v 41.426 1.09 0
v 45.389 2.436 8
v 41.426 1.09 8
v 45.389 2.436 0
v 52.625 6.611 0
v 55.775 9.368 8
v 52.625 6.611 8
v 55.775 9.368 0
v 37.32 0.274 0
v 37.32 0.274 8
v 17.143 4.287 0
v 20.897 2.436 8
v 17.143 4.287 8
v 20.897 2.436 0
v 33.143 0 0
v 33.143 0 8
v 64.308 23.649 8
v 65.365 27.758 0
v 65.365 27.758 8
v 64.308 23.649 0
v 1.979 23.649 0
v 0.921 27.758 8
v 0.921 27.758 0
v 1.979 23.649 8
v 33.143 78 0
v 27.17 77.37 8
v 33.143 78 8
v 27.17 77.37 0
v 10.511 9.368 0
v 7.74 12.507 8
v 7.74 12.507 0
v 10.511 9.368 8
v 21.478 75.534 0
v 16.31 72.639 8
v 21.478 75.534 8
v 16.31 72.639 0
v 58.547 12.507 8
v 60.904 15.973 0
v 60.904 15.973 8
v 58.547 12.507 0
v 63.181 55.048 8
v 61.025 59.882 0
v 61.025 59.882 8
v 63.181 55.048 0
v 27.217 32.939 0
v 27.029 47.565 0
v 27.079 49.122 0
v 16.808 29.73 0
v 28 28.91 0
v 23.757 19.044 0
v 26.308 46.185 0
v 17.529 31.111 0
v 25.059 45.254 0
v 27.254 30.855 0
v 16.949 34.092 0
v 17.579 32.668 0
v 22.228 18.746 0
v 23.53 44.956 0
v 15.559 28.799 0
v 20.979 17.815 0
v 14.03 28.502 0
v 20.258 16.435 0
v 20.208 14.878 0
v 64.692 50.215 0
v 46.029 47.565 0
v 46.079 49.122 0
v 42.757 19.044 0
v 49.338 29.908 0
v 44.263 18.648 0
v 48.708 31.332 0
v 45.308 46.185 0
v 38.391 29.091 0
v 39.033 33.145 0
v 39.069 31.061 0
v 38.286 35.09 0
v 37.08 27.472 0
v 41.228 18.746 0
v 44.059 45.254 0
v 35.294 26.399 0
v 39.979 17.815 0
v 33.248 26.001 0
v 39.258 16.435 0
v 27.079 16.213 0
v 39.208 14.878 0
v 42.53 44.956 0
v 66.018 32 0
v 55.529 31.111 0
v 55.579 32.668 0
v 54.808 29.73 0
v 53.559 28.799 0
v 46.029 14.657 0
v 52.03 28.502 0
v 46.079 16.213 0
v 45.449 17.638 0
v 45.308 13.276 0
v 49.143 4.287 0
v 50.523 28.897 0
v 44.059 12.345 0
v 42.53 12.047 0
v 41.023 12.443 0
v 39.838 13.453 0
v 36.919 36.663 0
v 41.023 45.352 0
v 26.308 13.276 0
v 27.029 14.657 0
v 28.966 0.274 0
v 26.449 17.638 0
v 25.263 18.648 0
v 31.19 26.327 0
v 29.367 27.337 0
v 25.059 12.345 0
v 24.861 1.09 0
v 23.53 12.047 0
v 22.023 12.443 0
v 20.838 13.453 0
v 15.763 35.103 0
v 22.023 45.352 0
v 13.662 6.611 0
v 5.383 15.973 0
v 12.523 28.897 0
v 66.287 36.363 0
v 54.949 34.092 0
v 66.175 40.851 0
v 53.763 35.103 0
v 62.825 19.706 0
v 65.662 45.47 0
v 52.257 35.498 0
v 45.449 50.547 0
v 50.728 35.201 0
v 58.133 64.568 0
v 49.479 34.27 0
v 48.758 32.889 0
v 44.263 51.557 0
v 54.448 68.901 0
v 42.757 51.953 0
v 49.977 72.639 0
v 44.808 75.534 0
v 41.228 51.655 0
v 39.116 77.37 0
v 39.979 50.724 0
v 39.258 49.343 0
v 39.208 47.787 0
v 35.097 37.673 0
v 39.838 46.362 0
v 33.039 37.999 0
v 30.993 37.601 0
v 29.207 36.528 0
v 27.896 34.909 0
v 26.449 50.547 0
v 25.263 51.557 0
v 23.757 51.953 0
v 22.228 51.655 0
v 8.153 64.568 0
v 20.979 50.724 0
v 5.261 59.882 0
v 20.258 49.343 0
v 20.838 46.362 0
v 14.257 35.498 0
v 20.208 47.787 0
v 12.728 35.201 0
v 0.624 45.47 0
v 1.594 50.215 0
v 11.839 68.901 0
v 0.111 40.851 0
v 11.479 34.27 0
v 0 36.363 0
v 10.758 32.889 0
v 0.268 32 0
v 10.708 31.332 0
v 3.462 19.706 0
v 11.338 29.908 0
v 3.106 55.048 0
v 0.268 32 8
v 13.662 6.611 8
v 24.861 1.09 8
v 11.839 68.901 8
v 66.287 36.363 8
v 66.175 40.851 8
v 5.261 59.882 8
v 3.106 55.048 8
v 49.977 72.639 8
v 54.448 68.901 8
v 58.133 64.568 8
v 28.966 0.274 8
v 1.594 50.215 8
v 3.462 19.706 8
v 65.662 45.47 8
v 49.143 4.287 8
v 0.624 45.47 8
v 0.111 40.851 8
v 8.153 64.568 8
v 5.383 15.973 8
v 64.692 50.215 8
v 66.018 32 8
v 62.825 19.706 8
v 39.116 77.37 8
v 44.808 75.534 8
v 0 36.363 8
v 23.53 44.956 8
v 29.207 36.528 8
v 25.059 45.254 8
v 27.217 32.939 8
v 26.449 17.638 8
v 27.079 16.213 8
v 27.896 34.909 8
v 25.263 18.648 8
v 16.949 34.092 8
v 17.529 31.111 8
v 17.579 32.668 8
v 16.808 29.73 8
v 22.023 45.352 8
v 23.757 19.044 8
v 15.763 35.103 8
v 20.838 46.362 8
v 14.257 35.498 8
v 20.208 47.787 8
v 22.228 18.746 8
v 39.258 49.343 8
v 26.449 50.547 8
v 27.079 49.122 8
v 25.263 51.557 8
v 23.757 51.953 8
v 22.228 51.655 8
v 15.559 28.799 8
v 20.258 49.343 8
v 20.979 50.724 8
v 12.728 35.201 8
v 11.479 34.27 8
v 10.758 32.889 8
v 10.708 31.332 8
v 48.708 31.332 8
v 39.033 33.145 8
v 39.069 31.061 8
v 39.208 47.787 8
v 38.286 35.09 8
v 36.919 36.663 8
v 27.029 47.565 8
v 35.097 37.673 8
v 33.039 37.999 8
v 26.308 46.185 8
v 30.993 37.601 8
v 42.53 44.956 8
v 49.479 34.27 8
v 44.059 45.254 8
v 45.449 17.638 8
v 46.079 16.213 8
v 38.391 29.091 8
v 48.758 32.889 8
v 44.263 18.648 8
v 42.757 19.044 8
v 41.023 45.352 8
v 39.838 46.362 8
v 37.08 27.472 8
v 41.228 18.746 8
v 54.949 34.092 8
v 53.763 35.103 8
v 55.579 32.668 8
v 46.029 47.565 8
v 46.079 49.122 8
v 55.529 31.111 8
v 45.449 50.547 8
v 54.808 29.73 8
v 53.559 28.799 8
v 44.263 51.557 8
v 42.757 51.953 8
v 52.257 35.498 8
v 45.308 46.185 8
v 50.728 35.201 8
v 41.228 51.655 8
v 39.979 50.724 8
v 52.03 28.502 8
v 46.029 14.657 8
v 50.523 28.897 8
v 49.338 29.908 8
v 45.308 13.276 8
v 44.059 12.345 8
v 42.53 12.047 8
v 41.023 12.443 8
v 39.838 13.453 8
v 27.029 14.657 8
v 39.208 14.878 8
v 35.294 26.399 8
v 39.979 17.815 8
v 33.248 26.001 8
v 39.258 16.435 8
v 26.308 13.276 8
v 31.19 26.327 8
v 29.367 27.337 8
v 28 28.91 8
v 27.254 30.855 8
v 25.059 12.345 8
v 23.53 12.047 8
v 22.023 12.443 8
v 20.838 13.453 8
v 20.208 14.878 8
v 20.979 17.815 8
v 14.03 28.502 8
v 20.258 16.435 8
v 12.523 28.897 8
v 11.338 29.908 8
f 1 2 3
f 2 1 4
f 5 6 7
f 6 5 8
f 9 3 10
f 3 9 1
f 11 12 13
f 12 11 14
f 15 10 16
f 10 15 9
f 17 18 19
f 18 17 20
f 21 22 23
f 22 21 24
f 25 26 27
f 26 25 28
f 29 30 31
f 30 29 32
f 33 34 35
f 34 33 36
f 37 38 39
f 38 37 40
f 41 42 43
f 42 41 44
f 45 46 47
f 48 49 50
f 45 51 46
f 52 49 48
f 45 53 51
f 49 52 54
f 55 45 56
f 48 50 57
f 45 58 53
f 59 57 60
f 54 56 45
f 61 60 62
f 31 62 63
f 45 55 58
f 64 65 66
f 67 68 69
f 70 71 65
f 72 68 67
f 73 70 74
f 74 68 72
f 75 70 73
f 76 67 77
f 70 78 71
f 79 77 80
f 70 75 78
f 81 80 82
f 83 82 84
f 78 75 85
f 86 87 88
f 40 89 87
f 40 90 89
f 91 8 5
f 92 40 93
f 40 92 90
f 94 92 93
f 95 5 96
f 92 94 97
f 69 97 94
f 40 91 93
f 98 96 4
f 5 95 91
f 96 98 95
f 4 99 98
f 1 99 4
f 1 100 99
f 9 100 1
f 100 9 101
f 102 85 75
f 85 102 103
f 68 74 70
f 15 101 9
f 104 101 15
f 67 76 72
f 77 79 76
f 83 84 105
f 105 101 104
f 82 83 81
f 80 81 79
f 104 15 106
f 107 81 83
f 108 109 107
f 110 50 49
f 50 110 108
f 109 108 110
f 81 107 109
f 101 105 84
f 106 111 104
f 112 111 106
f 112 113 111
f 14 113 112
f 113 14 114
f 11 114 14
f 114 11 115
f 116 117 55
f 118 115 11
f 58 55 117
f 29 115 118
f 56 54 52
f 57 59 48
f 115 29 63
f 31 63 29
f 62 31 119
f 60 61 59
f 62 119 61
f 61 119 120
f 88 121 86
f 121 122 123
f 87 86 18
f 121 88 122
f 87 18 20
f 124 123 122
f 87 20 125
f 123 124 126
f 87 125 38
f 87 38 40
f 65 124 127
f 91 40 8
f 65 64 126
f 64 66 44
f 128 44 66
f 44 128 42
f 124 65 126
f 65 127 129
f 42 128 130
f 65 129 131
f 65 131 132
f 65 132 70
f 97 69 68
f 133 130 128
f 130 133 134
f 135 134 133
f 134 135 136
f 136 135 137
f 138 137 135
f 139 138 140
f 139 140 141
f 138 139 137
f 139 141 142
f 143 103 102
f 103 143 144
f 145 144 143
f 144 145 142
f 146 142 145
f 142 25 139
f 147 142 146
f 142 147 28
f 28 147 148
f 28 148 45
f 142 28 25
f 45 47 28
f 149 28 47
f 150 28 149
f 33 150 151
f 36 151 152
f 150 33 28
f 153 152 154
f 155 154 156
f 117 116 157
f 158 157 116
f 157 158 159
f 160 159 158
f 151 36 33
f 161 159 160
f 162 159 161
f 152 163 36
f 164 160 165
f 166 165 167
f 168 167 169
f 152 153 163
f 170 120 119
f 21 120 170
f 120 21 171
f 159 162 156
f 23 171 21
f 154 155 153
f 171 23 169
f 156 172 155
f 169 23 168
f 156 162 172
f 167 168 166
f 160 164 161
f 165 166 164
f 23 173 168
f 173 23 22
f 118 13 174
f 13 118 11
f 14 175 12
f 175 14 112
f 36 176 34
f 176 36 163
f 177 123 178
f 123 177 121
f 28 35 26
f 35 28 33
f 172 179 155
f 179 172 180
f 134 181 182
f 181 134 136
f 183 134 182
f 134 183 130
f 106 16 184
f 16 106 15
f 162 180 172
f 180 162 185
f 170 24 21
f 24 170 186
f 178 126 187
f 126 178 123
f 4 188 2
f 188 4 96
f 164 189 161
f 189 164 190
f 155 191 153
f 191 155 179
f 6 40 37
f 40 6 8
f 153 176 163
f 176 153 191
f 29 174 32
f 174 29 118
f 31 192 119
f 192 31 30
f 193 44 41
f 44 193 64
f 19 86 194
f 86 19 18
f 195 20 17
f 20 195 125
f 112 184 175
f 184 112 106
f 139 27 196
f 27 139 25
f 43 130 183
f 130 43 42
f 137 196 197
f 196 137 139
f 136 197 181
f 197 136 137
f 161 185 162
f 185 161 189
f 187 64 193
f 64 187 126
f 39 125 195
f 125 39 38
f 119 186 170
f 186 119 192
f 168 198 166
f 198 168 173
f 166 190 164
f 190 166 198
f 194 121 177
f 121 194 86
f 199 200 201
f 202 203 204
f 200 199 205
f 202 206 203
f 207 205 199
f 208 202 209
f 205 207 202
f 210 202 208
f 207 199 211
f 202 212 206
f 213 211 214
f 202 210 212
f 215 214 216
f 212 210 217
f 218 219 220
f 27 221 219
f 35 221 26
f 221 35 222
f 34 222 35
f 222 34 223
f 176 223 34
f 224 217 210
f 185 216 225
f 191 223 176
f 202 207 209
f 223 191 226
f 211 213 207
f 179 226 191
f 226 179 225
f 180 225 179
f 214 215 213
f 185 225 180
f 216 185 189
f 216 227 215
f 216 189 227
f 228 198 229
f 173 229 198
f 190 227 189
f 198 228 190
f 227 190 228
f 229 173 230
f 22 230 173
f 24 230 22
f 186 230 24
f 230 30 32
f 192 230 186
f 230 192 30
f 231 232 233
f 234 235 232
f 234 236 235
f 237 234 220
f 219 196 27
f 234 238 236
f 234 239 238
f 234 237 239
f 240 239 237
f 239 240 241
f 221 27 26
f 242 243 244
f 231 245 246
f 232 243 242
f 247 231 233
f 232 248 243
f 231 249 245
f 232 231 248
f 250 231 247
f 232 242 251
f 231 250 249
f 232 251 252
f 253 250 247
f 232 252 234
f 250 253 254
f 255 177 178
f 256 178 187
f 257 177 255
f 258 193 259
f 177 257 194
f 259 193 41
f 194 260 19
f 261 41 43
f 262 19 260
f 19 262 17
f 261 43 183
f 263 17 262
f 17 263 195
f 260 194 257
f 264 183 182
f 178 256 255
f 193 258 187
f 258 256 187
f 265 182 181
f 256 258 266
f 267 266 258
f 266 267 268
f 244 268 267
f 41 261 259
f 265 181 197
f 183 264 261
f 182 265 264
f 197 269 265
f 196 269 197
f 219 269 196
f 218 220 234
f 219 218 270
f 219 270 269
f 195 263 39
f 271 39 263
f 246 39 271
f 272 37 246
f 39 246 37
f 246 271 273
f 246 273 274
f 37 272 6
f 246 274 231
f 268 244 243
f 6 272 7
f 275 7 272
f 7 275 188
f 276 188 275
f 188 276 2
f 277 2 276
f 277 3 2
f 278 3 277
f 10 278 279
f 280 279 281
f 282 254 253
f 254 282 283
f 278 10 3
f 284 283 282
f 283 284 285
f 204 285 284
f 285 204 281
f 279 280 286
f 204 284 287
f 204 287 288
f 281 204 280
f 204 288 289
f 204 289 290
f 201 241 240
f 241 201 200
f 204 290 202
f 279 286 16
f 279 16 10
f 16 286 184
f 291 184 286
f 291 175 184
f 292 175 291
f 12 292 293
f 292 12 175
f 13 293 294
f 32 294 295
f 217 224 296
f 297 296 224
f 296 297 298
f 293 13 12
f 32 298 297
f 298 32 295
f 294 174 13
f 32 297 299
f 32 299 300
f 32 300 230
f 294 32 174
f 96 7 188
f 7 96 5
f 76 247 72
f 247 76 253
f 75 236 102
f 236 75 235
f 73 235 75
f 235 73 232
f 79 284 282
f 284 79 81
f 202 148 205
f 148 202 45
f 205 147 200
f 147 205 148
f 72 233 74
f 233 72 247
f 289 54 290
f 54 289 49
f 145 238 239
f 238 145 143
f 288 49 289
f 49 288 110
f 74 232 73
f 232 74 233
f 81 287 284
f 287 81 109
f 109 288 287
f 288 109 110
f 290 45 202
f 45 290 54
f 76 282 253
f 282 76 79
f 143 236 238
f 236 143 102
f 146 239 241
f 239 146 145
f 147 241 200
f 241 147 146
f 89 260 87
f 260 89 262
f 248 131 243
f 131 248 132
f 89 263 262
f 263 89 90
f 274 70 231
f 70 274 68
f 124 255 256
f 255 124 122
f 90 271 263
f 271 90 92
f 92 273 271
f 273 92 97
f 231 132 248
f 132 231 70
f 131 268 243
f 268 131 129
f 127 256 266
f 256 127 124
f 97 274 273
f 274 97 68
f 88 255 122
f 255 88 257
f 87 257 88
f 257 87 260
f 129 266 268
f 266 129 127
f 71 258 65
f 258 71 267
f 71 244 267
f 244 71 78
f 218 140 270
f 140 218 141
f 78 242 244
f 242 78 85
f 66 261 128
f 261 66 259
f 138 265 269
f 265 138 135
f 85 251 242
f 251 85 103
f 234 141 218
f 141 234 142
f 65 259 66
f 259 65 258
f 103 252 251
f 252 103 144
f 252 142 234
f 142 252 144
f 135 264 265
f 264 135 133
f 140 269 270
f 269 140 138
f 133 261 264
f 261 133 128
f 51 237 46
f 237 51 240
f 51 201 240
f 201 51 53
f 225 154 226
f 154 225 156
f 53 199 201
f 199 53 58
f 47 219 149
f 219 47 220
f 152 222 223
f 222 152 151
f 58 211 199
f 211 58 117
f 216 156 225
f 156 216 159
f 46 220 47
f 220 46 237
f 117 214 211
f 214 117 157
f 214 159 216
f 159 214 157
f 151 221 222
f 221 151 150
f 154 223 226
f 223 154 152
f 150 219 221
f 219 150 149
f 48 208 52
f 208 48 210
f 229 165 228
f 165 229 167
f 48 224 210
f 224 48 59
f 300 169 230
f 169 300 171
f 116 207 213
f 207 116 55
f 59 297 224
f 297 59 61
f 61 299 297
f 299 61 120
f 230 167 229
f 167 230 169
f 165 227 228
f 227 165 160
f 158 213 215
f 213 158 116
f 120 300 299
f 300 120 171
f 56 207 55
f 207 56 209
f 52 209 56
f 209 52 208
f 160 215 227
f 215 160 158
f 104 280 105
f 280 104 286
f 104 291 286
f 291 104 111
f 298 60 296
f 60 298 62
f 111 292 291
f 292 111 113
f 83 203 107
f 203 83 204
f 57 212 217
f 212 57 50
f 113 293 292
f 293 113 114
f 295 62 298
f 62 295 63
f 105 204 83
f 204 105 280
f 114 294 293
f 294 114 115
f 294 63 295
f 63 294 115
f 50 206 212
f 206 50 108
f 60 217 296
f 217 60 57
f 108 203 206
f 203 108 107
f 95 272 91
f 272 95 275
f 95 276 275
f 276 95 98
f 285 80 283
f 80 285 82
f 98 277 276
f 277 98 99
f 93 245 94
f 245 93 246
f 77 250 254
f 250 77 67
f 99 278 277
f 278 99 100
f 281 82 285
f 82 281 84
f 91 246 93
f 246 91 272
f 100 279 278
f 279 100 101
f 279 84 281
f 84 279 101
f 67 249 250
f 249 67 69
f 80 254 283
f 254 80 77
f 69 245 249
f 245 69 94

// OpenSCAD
$fn = 32;

// ----------------------------------------------------------------------
// Cam plate: single_lobe cam, base R32
// ----------------------------------------------------------------------

// --- parameters (mm) ---
base_r = 32;              // base circle radius
lobe_h = 14;              // cam lobe rise
bore_r = 6;               // shaft bore radius
plate_t = 8;              // plate thickness, Z (extrusion height)
ring_r = 19;              // lightening ring radius
bolt_r = 3.5;             // lightening hole radius

profile = [[66.018, 32], [66.287, 36.363], [66.175, 40.851], [65.662, 45.47], [64.692, 50.215], [63.181, 55.048], [61.025, 59.882], [58.133, 64.568], [54.448, 68.901], [49.977, 72.639], [44.808, 75.534], [39.116, 77.37], [33.143, 78], [27.17, 77.37], [21.478, 75.534], [16.31, 72.639], [11.839, 68.901], [8.153, 64.568], [5.261, 59.882], [3.106, 55.048], [1.594, 50.215], [0.624, 45.47], [0.111, 40.851], [0, 36.363], [0.268, 32], [0.921, 27.758], [1.979, 23.649], [3.462, 19.706], [5.383, 15.973], [7.74, 12.507], [10.511, 9.368], [13.662, 6.611], [17.143, 4.287], [20.897, 2.436], [24.861, 1.09], [28.966, 0.274], [33.143, 0], [37.32, 0.274], [41.426, 1.09], [45.389, 2.436], [49.143, 4.287], [52.625, 6.611], [55.775, 9.368], [58.547, 12.507], [60.904, 15.973], [62.825, 19.706], [64.308, 23.649], [65.365, 27.758]];  // primary outline, 48 points, counter clockwise
void_1 = [[39.033, 33.145], [38.286, 35.09], [36.919, 36.663], [35.097, 37.673], [33.039, 37.999], [30.993, 37.601], [29.207, 36.528], [27.896, 34.909], [27.217, 32.939], [27.254, 30.855], [28, 28.91], [29.367, 27.337], [31.19, 26.327], [33.248, 26.001], [35.294, 26.399], [37.08, 27.472], [38.391, 29.091], [39.069, 31.061]];  // shaft bore, 18 points
void_2 = [[55.579, 32.668], [54.949, 34.092], [53.763, 35.103], [52.257, 35.498], [50.728, 35.201], [49.479, 34.27], [48.758, 32.889], [48.708, 31.332], [49.338, 29.908], [50.523, 28.897], [52.03, 28.502], [53.559, 28.799], [54.808, 29.73], [55.529, 31.111]];  // lightening hole 1, 14 points
void_3 = [[46.079, 49.122], [45.449, 50.547], [44.263, 51.557], [42.757, 51.953], [41.228, 51.655], [39.979, 50.724], [39.258, 49.343], [39.208, 47.787], [39.838, 46.362], [41.023, 45.352], [42.53, 44.956], [44.059, 45.254], [45.308, 46.185], [46.029, 47.565]];  // lightening hole 2, 14 points
void_4 = [[27.079, 49.122], [26.449, 50.547], [25.263, 51.557], [23.757, 51.953], [22.228, 51.655], [20.979, 50.724], [20.258, 49.343], [20.208, 47.787], [20.838, 46.362], [22.023, 45.352], [23.53, 44.956], [25.059, 45.254], [26.308, 46.185], [27.029, 47.565]];  // lightening hole 3, 14 points
void_5 = [[17.579, 32.668], [16.949, 34.092], [15.763, 35.103], [14.257, 35.498], [12.728, 35.201], [11.479, 34.27], [10.758, 32.889], [10.708, 31.332], [11.338, 29.908], [12.523, 28.897], [14.03, 28.502], [15.559, 28.799], [16.808, 29.73], [17.529, 31.111]];  // lightening hole 4, 14 points
void_6 = [[27.079, 16.213], [26.449, 17.638], [25.263, 18.648], [23.757, 19.044], [22.228, 18.746], [20.979, 17.815], [20.258, 16.435], [20.208, 14.878], [20.838, 13.453], [22.023, 12.443], [23.53, 12.047], [25.059, 12.345], [26.308, 13.276], [27.029, 14.657]];  // lightening hole 5, 14 points
void_7 = [[46.079, 16.213], [45.449, 17.638], [44.263, 18.648], [42.757, 19.044], [41.228, 18.746], [39.979, 17.815], [39.258, 16.435], [39.208, 14.878], [39.838, 13.453], [41.023, 12.443], [42.53, 12.047], [44.059, 12.345], [45.308, 13.276], [46.029, 14.657]];  // lightening hole 6, 14 points

// --- the one profile operation ---
difference() {
  linear_extrude(height = plate_t) polygon(points = profile);
  translate([0, 0, -1])
    linear_extrude(height = plate_t + 2) polygon(points = void_1);
  translate([0, 0, -1])
    linear_extrude(height = plate_t + 2) polygon(points = void_2);
  translate([0, 0, -1])
    linear_extrude(height = plate_t + 2) polygon(points = void_3);
  translate([0, 0, -1])
    linear_extrude(height = plate_t + 2) polygon(points = void_4);
  translate([0, 0, -1])
    linear_extrude(height = plate_t + 2) polygon(points = void_5);
  translate([0, 0, -1])
    linear_extrude(height = plate_t + 2) polygon(points = void_6);
  translate([0, 0, -1])
    linear_extrude(height = plate_t + 2) polygon(points = void_7);
}
